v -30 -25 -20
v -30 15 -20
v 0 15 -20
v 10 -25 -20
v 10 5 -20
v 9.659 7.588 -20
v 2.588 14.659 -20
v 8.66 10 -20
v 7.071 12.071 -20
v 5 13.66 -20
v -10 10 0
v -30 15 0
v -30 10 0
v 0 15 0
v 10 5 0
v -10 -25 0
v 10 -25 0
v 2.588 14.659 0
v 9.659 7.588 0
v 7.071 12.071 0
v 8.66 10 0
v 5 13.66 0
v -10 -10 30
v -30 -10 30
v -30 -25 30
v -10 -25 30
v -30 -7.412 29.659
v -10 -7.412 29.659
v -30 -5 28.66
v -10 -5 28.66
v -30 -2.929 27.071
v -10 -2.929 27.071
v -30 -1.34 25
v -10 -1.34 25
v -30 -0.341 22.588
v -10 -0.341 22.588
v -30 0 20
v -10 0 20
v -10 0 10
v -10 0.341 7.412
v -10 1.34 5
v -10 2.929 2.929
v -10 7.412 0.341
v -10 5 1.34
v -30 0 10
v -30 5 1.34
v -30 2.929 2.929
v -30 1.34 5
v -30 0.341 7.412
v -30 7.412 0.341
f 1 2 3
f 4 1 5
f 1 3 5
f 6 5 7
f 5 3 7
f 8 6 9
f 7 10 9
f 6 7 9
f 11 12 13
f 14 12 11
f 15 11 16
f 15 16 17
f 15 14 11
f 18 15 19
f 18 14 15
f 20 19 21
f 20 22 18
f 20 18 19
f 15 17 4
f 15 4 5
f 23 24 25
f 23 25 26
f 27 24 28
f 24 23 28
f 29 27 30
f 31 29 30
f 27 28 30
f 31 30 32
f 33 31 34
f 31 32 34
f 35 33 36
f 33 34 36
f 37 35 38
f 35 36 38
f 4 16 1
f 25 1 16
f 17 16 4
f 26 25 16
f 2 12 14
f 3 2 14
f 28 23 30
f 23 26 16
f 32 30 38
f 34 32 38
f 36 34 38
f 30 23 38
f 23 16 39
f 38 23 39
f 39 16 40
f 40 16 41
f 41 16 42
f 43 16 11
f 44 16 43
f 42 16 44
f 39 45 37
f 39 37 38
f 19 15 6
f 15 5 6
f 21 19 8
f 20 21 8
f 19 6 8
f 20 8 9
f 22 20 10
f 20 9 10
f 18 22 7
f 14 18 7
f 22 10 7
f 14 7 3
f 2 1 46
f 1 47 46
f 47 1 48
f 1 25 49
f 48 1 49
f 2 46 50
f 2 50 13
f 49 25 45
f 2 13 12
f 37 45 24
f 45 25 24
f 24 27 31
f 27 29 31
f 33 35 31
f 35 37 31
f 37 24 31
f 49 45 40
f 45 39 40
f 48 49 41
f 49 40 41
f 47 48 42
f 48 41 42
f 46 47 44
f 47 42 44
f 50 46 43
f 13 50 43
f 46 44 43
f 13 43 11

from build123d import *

# Parameters (mm, degrees)
SKETCH1_W           = 20
SKETCH1_H           = 25
BOSS_EXTRUDE1_DEPTH = 30
SKETCH2_W           = 40
SKETCH2_H           = 40
BOSS_EXTRUDE2_DEPTH = 20
FILLET1_R           = 10


with BuildPart() as part:
    # Sketch1 → Boss-Extrude1 (new body)
    with BuildSketch(Plane.XY):
        with Locations((-20, -12.5)):
            Rectangle(SKETCH1_W, SKETCH1_H)
    extrude(amount=BOSS_EXTRUDE1_DEPTH)

    # Sketch2 → Boss-Extrude2 (add)
    with BuildSketch(Plane.XY):
        with Locations((-10, -5)):
            Rectangle(SKETCH2_W, SKETCH2_H)
    extrude(amount=-BOSS_EXTRUDE2_DEPTH)

    # Fillet1
    fillet1_edges = [part.edges().sort_by_distance(p)[0] for p in [
        (-20, 0, 0),
        (10, 15, -10),
        (-20, 0, 30),
    ]]
    fillet(fillet1_edges, radius=FILLET1_R)


solid = part.part
